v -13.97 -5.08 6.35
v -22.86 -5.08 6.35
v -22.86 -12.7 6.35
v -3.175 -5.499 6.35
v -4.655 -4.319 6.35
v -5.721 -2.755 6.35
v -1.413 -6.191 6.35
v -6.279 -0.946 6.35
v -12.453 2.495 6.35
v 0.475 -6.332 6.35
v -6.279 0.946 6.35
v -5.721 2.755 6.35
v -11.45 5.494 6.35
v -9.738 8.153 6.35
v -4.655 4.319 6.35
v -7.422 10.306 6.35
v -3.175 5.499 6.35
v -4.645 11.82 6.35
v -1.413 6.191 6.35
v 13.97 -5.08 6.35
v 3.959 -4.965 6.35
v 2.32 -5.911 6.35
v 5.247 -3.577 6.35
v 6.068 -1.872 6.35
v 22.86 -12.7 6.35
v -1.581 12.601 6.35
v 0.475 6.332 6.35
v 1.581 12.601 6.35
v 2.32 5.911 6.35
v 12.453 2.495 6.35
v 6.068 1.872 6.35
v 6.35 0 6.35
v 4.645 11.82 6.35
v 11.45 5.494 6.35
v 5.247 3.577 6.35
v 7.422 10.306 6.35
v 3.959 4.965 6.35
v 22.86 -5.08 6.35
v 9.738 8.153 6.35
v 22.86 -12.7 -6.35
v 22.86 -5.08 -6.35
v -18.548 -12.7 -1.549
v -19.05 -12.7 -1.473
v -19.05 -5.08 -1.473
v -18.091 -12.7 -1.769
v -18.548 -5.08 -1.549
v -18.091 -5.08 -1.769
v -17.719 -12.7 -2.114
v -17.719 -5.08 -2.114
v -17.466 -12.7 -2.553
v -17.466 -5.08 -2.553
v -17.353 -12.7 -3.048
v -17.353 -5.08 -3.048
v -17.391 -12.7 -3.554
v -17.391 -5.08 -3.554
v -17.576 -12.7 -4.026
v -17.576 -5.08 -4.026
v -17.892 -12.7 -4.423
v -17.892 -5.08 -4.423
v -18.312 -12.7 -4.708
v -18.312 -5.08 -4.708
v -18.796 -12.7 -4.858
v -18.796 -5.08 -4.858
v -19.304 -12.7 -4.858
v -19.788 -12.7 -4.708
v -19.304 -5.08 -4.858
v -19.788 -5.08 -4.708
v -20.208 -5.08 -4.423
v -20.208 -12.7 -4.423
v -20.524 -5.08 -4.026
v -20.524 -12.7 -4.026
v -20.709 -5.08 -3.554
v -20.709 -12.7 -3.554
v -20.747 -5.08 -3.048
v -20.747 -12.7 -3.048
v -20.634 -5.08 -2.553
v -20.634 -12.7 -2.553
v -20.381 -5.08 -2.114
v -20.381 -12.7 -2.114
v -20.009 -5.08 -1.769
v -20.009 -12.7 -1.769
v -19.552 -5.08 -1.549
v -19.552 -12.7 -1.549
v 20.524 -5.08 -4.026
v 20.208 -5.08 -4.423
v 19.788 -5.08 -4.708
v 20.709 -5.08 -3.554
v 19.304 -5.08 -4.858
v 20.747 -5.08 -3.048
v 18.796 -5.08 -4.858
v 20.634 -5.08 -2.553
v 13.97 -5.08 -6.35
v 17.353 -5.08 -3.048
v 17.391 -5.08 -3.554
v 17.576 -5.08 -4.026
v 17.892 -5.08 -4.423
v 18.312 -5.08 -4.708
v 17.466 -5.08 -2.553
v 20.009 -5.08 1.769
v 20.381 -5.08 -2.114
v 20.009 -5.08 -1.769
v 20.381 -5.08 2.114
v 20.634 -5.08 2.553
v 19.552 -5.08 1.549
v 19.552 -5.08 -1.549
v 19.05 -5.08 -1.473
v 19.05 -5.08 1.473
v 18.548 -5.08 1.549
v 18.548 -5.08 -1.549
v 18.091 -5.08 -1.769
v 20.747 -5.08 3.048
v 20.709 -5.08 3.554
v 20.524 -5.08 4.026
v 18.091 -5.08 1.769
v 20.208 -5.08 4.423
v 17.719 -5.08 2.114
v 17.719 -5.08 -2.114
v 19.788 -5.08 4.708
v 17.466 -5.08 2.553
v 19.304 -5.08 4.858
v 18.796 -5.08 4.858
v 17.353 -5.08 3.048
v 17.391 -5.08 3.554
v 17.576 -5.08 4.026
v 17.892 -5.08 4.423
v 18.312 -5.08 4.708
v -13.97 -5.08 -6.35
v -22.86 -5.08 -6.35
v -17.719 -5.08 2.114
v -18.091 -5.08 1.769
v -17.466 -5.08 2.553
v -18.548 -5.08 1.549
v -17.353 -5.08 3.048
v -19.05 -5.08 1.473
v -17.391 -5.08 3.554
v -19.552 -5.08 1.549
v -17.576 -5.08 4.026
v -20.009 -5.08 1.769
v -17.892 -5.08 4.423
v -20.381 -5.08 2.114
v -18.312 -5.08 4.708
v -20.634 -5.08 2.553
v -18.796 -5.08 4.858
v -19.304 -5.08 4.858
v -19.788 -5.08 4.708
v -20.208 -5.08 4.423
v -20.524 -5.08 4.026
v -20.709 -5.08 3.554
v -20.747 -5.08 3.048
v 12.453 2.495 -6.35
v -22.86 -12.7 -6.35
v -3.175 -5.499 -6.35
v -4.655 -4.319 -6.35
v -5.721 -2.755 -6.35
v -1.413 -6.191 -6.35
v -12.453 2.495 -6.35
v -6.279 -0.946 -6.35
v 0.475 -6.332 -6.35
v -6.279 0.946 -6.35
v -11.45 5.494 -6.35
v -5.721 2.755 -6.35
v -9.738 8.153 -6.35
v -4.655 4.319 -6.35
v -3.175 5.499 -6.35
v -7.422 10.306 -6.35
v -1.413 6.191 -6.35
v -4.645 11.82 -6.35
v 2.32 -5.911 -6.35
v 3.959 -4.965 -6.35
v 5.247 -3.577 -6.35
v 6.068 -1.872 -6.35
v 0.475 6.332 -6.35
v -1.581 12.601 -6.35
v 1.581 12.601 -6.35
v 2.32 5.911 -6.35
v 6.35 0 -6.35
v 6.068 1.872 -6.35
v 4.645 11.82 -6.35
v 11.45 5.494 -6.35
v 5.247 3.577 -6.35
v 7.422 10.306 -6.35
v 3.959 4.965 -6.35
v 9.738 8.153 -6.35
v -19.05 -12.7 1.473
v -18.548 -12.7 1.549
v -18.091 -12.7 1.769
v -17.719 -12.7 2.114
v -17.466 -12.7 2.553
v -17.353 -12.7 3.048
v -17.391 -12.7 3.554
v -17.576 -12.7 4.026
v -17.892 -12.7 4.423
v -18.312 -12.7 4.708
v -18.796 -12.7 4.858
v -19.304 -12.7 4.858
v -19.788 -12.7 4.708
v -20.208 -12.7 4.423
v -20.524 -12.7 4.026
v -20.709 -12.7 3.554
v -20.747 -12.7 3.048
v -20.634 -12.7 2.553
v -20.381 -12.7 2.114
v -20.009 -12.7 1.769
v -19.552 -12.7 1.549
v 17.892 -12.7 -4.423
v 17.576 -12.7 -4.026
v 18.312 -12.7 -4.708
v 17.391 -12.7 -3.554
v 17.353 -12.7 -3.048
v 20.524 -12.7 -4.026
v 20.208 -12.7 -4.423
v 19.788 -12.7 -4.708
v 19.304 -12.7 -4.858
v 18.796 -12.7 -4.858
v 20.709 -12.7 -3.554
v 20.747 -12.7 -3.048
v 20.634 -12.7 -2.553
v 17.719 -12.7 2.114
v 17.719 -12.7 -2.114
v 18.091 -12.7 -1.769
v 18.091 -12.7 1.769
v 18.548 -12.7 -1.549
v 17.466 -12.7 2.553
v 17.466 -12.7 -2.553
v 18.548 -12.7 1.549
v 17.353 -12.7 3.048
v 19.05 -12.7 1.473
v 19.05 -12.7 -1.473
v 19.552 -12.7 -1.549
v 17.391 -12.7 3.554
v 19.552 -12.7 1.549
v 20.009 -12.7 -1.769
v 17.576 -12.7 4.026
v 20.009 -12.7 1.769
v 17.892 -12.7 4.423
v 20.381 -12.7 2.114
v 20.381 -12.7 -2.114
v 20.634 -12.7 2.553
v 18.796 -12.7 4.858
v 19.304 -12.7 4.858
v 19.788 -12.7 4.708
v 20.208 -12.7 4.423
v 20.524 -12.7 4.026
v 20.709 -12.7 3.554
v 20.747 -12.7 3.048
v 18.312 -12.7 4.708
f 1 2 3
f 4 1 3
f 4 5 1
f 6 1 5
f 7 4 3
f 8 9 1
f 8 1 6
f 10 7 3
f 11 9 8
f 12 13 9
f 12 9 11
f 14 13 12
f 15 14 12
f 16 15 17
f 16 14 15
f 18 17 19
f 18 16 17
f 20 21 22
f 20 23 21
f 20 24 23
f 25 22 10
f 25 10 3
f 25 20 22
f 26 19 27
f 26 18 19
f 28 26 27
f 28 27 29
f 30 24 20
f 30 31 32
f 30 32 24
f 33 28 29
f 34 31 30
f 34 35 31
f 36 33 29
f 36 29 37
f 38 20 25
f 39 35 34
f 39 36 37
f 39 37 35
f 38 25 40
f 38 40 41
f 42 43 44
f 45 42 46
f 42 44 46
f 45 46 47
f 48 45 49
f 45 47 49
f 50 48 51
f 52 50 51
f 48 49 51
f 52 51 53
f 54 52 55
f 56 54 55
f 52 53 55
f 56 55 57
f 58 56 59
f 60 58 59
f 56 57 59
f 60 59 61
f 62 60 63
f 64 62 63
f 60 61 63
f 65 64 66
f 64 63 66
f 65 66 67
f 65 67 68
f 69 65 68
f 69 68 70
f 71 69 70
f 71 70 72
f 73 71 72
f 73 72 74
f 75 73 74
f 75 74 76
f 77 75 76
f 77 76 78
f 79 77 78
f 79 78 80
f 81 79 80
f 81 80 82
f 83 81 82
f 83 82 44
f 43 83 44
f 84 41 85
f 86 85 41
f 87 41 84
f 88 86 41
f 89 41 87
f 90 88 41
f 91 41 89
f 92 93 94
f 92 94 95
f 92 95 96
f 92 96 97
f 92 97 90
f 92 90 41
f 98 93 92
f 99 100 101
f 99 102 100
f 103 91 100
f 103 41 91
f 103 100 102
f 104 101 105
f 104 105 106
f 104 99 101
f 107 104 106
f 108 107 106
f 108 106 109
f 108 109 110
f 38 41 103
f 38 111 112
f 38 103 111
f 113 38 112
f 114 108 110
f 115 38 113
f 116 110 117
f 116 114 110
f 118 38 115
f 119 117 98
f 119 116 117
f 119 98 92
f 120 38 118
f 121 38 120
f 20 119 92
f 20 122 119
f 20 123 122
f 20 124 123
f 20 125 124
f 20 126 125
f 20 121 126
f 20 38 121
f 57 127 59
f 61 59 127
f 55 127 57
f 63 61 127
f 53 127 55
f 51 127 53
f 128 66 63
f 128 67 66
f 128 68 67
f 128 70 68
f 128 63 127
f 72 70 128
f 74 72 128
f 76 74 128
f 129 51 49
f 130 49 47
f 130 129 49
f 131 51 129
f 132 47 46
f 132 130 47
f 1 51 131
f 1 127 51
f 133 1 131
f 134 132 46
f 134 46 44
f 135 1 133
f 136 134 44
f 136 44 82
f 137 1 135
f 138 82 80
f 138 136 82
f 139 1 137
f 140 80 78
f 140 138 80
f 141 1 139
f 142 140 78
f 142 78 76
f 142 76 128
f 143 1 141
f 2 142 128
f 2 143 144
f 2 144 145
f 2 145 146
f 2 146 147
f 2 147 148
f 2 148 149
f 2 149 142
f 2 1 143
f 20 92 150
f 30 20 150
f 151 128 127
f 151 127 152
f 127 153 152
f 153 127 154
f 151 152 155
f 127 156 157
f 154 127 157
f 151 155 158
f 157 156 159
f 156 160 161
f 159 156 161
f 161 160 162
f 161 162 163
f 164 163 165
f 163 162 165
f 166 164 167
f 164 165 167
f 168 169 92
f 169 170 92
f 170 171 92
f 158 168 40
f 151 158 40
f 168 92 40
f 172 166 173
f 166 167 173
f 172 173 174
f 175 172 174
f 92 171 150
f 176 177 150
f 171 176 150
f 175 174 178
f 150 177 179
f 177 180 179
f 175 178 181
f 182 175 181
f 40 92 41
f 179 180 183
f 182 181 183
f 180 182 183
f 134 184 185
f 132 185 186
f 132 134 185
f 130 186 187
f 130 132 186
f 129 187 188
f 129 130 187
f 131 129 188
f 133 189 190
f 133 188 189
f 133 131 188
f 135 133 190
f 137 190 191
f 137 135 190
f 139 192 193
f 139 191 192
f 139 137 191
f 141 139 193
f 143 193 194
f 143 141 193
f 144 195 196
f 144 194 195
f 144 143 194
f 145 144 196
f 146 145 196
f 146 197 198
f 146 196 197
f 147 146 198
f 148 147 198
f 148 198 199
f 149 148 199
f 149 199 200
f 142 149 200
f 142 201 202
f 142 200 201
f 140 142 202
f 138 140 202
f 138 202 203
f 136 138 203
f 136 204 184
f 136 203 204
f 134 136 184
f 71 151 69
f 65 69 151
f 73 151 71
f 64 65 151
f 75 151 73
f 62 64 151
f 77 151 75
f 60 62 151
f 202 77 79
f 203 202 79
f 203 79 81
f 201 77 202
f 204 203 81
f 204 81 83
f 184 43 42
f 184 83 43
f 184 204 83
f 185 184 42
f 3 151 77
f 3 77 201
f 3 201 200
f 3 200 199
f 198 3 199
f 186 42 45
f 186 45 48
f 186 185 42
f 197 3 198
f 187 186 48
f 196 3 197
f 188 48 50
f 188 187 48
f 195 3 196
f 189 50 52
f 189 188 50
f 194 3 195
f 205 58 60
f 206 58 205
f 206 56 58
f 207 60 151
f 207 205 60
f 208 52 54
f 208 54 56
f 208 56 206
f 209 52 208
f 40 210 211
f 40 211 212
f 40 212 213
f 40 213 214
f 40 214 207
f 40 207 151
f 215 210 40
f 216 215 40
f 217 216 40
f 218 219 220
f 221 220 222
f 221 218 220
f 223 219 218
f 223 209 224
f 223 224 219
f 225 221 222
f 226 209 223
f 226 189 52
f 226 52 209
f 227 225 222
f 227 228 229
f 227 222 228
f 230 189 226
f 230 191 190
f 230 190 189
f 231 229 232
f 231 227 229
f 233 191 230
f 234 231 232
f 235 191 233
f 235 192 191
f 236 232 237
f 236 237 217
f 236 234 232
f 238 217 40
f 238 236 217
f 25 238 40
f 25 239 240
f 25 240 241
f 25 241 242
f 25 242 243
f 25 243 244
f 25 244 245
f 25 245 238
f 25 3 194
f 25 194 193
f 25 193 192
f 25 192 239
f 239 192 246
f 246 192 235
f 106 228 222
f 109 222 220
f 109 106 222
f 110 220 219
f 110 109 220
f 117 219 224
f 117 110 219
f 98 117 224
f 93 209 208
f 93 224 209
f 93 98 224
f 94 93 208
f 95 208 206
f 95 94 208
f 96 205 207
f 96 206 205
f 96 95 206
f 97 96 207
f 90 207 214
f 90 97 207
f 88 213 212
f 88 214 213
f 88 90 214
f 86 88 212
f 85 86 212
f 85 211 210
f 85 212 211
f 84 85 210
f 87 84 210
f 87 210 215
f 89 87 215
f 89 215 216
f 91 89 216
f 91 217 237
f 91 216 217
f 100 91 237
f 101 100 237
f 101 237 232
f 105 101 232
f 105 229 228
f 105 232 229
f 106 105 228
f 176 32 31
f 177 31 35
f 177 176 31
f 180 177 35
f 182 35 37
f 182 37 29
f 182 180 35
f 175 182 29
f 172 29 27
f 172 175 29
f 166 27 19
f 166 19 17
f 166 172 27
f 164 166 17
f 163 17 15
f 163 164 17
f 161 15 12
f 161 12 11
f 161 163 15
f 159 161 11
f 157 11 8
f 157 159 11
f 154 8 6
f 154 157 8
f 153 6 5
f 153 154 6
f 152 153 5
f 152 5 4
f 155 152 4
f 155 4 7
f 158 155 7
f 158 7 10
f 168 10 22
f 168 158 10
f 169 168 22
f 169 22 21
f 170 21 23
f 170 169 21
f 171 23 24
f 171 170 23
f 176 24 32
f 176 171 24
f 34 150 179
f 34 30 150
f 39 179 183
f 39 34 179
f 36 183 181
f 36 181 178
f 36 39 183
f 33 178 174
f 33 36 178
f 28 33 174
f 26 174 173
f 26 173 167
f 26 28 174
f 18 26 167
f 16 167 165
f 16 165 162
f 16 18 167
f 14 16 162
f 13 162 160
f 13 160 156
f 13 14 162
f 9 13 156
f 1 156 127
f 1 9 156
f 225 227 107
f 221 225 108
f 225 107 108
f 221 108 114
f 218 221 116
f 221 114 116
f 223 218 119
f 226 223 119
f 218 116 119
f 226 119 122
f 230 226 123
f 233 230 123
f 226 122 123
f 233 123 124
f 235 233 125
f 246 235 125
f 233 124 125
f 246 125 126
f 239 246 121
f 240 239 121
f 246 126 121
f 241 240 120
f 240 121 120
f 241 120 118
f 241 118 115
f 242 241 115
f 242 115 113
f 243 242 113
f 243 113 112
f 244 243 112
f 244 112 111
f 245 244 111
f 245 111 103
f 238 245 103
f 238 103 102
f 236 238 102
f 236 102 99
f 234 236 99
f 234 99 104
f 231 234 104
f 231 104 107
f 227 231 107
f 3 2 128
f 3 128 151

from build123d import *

# Parameters (mm, degrees)
SKETCH1_R                                  = 6.35
BOSS_EXTRUDE1_DEPTH                        = 6.35
SKETCH2_R                                  = 1.7018
CUT_EXTRUDE1_DEPTH                         = 30.648448526
MIRROR1_AT_THE_SECOND_PLANE_COPY_1_SKETC_R = 1.7018
MIRROR1_AT_THE_SECOND_PLANE_COPY_1_DEPTH   = 30.648448526


with BuildPart() as part:
    # Sketch1 → Boss-Extrude1 (new, symmetric)
    with BuildSketch(Plane.XY):
        with BuildLine():
            Line((-12.452586398, 2.494612595), (-13.97, -5.08))
            Line((-13.97, -5.08), (-22.86, -5.08))
            Line((-22.86, -5.08), (-22.86, -12.7))
            Line((-22.86, -12.7), (22.86, -12.7))
            Line((22.86, -12.7), (22.86, -5.08))
            Line((22.86, -5.08), (13.97, -5.08))
            Line((13.97, -5.08), (12.452586398, 2.494612595))
            ThreePointArc((12.452586398, 2.494612595), (0, 12.7), (-12.452586398, 2.494612595))
        make_face()
        Circle(SKETCH1_R, mode=Mode.SUBTRACT)
    extrude(amount=BOSS_EXTRUDE1_DEPTH, both=True)

    # Sketch2 → Cut-Extrude1 (cut, through all)
    with BuildSketch(Plane(origin=(0, -5.08, 0), x_dir=(1, 0, 0), z_dir=(0, 1, 0))):
        with Locations(Location((-19.05, 3.175, 0), (0, 0, 270))):
            Circle(SKETCH2_R)
    cut_extrude1 = extrude(amount=-CUT_EXTRUDE1_DEPTH, mode=Mode.SUBTRACT)

    # Mirror1: Cut-Extrude1 across plane
    add(cut_extrude1.mirror(Plane(origin=(0, 0, 0), x_dir=(0, 0, 1), z_dir=(1, 0, 0))), mode=Mode.SUBTRACT)

    # Mirror1 at the second plane: Cut-Extrude1 across plane
    add(cut_extrude1.mirror(Plane.XY), mode=Mode.SUBTRACT)

    # Mirror1 at the second plane copy 1 sketc → Mirror1 at the second plane copy 1 (cut, through all)
    with BuildSketch(Plane(origin=(0, -5.08, 0), x_dir=(-1, 0, 0), z_dir=(0, 1, 0))):
        with Locations(Location((-19.05, 3.175, 0), (0, 0, 270))):
            Circle(MIRROR1_AT_THE_SECOND_PLANE_COPY_1_SKETC_R)
    extrude(amount=-MIRROR1_AT_THE_SECOND_PLANE_COPY_1_DEPTH, mode=Mode.SUBTRACT)


solid = part.part
